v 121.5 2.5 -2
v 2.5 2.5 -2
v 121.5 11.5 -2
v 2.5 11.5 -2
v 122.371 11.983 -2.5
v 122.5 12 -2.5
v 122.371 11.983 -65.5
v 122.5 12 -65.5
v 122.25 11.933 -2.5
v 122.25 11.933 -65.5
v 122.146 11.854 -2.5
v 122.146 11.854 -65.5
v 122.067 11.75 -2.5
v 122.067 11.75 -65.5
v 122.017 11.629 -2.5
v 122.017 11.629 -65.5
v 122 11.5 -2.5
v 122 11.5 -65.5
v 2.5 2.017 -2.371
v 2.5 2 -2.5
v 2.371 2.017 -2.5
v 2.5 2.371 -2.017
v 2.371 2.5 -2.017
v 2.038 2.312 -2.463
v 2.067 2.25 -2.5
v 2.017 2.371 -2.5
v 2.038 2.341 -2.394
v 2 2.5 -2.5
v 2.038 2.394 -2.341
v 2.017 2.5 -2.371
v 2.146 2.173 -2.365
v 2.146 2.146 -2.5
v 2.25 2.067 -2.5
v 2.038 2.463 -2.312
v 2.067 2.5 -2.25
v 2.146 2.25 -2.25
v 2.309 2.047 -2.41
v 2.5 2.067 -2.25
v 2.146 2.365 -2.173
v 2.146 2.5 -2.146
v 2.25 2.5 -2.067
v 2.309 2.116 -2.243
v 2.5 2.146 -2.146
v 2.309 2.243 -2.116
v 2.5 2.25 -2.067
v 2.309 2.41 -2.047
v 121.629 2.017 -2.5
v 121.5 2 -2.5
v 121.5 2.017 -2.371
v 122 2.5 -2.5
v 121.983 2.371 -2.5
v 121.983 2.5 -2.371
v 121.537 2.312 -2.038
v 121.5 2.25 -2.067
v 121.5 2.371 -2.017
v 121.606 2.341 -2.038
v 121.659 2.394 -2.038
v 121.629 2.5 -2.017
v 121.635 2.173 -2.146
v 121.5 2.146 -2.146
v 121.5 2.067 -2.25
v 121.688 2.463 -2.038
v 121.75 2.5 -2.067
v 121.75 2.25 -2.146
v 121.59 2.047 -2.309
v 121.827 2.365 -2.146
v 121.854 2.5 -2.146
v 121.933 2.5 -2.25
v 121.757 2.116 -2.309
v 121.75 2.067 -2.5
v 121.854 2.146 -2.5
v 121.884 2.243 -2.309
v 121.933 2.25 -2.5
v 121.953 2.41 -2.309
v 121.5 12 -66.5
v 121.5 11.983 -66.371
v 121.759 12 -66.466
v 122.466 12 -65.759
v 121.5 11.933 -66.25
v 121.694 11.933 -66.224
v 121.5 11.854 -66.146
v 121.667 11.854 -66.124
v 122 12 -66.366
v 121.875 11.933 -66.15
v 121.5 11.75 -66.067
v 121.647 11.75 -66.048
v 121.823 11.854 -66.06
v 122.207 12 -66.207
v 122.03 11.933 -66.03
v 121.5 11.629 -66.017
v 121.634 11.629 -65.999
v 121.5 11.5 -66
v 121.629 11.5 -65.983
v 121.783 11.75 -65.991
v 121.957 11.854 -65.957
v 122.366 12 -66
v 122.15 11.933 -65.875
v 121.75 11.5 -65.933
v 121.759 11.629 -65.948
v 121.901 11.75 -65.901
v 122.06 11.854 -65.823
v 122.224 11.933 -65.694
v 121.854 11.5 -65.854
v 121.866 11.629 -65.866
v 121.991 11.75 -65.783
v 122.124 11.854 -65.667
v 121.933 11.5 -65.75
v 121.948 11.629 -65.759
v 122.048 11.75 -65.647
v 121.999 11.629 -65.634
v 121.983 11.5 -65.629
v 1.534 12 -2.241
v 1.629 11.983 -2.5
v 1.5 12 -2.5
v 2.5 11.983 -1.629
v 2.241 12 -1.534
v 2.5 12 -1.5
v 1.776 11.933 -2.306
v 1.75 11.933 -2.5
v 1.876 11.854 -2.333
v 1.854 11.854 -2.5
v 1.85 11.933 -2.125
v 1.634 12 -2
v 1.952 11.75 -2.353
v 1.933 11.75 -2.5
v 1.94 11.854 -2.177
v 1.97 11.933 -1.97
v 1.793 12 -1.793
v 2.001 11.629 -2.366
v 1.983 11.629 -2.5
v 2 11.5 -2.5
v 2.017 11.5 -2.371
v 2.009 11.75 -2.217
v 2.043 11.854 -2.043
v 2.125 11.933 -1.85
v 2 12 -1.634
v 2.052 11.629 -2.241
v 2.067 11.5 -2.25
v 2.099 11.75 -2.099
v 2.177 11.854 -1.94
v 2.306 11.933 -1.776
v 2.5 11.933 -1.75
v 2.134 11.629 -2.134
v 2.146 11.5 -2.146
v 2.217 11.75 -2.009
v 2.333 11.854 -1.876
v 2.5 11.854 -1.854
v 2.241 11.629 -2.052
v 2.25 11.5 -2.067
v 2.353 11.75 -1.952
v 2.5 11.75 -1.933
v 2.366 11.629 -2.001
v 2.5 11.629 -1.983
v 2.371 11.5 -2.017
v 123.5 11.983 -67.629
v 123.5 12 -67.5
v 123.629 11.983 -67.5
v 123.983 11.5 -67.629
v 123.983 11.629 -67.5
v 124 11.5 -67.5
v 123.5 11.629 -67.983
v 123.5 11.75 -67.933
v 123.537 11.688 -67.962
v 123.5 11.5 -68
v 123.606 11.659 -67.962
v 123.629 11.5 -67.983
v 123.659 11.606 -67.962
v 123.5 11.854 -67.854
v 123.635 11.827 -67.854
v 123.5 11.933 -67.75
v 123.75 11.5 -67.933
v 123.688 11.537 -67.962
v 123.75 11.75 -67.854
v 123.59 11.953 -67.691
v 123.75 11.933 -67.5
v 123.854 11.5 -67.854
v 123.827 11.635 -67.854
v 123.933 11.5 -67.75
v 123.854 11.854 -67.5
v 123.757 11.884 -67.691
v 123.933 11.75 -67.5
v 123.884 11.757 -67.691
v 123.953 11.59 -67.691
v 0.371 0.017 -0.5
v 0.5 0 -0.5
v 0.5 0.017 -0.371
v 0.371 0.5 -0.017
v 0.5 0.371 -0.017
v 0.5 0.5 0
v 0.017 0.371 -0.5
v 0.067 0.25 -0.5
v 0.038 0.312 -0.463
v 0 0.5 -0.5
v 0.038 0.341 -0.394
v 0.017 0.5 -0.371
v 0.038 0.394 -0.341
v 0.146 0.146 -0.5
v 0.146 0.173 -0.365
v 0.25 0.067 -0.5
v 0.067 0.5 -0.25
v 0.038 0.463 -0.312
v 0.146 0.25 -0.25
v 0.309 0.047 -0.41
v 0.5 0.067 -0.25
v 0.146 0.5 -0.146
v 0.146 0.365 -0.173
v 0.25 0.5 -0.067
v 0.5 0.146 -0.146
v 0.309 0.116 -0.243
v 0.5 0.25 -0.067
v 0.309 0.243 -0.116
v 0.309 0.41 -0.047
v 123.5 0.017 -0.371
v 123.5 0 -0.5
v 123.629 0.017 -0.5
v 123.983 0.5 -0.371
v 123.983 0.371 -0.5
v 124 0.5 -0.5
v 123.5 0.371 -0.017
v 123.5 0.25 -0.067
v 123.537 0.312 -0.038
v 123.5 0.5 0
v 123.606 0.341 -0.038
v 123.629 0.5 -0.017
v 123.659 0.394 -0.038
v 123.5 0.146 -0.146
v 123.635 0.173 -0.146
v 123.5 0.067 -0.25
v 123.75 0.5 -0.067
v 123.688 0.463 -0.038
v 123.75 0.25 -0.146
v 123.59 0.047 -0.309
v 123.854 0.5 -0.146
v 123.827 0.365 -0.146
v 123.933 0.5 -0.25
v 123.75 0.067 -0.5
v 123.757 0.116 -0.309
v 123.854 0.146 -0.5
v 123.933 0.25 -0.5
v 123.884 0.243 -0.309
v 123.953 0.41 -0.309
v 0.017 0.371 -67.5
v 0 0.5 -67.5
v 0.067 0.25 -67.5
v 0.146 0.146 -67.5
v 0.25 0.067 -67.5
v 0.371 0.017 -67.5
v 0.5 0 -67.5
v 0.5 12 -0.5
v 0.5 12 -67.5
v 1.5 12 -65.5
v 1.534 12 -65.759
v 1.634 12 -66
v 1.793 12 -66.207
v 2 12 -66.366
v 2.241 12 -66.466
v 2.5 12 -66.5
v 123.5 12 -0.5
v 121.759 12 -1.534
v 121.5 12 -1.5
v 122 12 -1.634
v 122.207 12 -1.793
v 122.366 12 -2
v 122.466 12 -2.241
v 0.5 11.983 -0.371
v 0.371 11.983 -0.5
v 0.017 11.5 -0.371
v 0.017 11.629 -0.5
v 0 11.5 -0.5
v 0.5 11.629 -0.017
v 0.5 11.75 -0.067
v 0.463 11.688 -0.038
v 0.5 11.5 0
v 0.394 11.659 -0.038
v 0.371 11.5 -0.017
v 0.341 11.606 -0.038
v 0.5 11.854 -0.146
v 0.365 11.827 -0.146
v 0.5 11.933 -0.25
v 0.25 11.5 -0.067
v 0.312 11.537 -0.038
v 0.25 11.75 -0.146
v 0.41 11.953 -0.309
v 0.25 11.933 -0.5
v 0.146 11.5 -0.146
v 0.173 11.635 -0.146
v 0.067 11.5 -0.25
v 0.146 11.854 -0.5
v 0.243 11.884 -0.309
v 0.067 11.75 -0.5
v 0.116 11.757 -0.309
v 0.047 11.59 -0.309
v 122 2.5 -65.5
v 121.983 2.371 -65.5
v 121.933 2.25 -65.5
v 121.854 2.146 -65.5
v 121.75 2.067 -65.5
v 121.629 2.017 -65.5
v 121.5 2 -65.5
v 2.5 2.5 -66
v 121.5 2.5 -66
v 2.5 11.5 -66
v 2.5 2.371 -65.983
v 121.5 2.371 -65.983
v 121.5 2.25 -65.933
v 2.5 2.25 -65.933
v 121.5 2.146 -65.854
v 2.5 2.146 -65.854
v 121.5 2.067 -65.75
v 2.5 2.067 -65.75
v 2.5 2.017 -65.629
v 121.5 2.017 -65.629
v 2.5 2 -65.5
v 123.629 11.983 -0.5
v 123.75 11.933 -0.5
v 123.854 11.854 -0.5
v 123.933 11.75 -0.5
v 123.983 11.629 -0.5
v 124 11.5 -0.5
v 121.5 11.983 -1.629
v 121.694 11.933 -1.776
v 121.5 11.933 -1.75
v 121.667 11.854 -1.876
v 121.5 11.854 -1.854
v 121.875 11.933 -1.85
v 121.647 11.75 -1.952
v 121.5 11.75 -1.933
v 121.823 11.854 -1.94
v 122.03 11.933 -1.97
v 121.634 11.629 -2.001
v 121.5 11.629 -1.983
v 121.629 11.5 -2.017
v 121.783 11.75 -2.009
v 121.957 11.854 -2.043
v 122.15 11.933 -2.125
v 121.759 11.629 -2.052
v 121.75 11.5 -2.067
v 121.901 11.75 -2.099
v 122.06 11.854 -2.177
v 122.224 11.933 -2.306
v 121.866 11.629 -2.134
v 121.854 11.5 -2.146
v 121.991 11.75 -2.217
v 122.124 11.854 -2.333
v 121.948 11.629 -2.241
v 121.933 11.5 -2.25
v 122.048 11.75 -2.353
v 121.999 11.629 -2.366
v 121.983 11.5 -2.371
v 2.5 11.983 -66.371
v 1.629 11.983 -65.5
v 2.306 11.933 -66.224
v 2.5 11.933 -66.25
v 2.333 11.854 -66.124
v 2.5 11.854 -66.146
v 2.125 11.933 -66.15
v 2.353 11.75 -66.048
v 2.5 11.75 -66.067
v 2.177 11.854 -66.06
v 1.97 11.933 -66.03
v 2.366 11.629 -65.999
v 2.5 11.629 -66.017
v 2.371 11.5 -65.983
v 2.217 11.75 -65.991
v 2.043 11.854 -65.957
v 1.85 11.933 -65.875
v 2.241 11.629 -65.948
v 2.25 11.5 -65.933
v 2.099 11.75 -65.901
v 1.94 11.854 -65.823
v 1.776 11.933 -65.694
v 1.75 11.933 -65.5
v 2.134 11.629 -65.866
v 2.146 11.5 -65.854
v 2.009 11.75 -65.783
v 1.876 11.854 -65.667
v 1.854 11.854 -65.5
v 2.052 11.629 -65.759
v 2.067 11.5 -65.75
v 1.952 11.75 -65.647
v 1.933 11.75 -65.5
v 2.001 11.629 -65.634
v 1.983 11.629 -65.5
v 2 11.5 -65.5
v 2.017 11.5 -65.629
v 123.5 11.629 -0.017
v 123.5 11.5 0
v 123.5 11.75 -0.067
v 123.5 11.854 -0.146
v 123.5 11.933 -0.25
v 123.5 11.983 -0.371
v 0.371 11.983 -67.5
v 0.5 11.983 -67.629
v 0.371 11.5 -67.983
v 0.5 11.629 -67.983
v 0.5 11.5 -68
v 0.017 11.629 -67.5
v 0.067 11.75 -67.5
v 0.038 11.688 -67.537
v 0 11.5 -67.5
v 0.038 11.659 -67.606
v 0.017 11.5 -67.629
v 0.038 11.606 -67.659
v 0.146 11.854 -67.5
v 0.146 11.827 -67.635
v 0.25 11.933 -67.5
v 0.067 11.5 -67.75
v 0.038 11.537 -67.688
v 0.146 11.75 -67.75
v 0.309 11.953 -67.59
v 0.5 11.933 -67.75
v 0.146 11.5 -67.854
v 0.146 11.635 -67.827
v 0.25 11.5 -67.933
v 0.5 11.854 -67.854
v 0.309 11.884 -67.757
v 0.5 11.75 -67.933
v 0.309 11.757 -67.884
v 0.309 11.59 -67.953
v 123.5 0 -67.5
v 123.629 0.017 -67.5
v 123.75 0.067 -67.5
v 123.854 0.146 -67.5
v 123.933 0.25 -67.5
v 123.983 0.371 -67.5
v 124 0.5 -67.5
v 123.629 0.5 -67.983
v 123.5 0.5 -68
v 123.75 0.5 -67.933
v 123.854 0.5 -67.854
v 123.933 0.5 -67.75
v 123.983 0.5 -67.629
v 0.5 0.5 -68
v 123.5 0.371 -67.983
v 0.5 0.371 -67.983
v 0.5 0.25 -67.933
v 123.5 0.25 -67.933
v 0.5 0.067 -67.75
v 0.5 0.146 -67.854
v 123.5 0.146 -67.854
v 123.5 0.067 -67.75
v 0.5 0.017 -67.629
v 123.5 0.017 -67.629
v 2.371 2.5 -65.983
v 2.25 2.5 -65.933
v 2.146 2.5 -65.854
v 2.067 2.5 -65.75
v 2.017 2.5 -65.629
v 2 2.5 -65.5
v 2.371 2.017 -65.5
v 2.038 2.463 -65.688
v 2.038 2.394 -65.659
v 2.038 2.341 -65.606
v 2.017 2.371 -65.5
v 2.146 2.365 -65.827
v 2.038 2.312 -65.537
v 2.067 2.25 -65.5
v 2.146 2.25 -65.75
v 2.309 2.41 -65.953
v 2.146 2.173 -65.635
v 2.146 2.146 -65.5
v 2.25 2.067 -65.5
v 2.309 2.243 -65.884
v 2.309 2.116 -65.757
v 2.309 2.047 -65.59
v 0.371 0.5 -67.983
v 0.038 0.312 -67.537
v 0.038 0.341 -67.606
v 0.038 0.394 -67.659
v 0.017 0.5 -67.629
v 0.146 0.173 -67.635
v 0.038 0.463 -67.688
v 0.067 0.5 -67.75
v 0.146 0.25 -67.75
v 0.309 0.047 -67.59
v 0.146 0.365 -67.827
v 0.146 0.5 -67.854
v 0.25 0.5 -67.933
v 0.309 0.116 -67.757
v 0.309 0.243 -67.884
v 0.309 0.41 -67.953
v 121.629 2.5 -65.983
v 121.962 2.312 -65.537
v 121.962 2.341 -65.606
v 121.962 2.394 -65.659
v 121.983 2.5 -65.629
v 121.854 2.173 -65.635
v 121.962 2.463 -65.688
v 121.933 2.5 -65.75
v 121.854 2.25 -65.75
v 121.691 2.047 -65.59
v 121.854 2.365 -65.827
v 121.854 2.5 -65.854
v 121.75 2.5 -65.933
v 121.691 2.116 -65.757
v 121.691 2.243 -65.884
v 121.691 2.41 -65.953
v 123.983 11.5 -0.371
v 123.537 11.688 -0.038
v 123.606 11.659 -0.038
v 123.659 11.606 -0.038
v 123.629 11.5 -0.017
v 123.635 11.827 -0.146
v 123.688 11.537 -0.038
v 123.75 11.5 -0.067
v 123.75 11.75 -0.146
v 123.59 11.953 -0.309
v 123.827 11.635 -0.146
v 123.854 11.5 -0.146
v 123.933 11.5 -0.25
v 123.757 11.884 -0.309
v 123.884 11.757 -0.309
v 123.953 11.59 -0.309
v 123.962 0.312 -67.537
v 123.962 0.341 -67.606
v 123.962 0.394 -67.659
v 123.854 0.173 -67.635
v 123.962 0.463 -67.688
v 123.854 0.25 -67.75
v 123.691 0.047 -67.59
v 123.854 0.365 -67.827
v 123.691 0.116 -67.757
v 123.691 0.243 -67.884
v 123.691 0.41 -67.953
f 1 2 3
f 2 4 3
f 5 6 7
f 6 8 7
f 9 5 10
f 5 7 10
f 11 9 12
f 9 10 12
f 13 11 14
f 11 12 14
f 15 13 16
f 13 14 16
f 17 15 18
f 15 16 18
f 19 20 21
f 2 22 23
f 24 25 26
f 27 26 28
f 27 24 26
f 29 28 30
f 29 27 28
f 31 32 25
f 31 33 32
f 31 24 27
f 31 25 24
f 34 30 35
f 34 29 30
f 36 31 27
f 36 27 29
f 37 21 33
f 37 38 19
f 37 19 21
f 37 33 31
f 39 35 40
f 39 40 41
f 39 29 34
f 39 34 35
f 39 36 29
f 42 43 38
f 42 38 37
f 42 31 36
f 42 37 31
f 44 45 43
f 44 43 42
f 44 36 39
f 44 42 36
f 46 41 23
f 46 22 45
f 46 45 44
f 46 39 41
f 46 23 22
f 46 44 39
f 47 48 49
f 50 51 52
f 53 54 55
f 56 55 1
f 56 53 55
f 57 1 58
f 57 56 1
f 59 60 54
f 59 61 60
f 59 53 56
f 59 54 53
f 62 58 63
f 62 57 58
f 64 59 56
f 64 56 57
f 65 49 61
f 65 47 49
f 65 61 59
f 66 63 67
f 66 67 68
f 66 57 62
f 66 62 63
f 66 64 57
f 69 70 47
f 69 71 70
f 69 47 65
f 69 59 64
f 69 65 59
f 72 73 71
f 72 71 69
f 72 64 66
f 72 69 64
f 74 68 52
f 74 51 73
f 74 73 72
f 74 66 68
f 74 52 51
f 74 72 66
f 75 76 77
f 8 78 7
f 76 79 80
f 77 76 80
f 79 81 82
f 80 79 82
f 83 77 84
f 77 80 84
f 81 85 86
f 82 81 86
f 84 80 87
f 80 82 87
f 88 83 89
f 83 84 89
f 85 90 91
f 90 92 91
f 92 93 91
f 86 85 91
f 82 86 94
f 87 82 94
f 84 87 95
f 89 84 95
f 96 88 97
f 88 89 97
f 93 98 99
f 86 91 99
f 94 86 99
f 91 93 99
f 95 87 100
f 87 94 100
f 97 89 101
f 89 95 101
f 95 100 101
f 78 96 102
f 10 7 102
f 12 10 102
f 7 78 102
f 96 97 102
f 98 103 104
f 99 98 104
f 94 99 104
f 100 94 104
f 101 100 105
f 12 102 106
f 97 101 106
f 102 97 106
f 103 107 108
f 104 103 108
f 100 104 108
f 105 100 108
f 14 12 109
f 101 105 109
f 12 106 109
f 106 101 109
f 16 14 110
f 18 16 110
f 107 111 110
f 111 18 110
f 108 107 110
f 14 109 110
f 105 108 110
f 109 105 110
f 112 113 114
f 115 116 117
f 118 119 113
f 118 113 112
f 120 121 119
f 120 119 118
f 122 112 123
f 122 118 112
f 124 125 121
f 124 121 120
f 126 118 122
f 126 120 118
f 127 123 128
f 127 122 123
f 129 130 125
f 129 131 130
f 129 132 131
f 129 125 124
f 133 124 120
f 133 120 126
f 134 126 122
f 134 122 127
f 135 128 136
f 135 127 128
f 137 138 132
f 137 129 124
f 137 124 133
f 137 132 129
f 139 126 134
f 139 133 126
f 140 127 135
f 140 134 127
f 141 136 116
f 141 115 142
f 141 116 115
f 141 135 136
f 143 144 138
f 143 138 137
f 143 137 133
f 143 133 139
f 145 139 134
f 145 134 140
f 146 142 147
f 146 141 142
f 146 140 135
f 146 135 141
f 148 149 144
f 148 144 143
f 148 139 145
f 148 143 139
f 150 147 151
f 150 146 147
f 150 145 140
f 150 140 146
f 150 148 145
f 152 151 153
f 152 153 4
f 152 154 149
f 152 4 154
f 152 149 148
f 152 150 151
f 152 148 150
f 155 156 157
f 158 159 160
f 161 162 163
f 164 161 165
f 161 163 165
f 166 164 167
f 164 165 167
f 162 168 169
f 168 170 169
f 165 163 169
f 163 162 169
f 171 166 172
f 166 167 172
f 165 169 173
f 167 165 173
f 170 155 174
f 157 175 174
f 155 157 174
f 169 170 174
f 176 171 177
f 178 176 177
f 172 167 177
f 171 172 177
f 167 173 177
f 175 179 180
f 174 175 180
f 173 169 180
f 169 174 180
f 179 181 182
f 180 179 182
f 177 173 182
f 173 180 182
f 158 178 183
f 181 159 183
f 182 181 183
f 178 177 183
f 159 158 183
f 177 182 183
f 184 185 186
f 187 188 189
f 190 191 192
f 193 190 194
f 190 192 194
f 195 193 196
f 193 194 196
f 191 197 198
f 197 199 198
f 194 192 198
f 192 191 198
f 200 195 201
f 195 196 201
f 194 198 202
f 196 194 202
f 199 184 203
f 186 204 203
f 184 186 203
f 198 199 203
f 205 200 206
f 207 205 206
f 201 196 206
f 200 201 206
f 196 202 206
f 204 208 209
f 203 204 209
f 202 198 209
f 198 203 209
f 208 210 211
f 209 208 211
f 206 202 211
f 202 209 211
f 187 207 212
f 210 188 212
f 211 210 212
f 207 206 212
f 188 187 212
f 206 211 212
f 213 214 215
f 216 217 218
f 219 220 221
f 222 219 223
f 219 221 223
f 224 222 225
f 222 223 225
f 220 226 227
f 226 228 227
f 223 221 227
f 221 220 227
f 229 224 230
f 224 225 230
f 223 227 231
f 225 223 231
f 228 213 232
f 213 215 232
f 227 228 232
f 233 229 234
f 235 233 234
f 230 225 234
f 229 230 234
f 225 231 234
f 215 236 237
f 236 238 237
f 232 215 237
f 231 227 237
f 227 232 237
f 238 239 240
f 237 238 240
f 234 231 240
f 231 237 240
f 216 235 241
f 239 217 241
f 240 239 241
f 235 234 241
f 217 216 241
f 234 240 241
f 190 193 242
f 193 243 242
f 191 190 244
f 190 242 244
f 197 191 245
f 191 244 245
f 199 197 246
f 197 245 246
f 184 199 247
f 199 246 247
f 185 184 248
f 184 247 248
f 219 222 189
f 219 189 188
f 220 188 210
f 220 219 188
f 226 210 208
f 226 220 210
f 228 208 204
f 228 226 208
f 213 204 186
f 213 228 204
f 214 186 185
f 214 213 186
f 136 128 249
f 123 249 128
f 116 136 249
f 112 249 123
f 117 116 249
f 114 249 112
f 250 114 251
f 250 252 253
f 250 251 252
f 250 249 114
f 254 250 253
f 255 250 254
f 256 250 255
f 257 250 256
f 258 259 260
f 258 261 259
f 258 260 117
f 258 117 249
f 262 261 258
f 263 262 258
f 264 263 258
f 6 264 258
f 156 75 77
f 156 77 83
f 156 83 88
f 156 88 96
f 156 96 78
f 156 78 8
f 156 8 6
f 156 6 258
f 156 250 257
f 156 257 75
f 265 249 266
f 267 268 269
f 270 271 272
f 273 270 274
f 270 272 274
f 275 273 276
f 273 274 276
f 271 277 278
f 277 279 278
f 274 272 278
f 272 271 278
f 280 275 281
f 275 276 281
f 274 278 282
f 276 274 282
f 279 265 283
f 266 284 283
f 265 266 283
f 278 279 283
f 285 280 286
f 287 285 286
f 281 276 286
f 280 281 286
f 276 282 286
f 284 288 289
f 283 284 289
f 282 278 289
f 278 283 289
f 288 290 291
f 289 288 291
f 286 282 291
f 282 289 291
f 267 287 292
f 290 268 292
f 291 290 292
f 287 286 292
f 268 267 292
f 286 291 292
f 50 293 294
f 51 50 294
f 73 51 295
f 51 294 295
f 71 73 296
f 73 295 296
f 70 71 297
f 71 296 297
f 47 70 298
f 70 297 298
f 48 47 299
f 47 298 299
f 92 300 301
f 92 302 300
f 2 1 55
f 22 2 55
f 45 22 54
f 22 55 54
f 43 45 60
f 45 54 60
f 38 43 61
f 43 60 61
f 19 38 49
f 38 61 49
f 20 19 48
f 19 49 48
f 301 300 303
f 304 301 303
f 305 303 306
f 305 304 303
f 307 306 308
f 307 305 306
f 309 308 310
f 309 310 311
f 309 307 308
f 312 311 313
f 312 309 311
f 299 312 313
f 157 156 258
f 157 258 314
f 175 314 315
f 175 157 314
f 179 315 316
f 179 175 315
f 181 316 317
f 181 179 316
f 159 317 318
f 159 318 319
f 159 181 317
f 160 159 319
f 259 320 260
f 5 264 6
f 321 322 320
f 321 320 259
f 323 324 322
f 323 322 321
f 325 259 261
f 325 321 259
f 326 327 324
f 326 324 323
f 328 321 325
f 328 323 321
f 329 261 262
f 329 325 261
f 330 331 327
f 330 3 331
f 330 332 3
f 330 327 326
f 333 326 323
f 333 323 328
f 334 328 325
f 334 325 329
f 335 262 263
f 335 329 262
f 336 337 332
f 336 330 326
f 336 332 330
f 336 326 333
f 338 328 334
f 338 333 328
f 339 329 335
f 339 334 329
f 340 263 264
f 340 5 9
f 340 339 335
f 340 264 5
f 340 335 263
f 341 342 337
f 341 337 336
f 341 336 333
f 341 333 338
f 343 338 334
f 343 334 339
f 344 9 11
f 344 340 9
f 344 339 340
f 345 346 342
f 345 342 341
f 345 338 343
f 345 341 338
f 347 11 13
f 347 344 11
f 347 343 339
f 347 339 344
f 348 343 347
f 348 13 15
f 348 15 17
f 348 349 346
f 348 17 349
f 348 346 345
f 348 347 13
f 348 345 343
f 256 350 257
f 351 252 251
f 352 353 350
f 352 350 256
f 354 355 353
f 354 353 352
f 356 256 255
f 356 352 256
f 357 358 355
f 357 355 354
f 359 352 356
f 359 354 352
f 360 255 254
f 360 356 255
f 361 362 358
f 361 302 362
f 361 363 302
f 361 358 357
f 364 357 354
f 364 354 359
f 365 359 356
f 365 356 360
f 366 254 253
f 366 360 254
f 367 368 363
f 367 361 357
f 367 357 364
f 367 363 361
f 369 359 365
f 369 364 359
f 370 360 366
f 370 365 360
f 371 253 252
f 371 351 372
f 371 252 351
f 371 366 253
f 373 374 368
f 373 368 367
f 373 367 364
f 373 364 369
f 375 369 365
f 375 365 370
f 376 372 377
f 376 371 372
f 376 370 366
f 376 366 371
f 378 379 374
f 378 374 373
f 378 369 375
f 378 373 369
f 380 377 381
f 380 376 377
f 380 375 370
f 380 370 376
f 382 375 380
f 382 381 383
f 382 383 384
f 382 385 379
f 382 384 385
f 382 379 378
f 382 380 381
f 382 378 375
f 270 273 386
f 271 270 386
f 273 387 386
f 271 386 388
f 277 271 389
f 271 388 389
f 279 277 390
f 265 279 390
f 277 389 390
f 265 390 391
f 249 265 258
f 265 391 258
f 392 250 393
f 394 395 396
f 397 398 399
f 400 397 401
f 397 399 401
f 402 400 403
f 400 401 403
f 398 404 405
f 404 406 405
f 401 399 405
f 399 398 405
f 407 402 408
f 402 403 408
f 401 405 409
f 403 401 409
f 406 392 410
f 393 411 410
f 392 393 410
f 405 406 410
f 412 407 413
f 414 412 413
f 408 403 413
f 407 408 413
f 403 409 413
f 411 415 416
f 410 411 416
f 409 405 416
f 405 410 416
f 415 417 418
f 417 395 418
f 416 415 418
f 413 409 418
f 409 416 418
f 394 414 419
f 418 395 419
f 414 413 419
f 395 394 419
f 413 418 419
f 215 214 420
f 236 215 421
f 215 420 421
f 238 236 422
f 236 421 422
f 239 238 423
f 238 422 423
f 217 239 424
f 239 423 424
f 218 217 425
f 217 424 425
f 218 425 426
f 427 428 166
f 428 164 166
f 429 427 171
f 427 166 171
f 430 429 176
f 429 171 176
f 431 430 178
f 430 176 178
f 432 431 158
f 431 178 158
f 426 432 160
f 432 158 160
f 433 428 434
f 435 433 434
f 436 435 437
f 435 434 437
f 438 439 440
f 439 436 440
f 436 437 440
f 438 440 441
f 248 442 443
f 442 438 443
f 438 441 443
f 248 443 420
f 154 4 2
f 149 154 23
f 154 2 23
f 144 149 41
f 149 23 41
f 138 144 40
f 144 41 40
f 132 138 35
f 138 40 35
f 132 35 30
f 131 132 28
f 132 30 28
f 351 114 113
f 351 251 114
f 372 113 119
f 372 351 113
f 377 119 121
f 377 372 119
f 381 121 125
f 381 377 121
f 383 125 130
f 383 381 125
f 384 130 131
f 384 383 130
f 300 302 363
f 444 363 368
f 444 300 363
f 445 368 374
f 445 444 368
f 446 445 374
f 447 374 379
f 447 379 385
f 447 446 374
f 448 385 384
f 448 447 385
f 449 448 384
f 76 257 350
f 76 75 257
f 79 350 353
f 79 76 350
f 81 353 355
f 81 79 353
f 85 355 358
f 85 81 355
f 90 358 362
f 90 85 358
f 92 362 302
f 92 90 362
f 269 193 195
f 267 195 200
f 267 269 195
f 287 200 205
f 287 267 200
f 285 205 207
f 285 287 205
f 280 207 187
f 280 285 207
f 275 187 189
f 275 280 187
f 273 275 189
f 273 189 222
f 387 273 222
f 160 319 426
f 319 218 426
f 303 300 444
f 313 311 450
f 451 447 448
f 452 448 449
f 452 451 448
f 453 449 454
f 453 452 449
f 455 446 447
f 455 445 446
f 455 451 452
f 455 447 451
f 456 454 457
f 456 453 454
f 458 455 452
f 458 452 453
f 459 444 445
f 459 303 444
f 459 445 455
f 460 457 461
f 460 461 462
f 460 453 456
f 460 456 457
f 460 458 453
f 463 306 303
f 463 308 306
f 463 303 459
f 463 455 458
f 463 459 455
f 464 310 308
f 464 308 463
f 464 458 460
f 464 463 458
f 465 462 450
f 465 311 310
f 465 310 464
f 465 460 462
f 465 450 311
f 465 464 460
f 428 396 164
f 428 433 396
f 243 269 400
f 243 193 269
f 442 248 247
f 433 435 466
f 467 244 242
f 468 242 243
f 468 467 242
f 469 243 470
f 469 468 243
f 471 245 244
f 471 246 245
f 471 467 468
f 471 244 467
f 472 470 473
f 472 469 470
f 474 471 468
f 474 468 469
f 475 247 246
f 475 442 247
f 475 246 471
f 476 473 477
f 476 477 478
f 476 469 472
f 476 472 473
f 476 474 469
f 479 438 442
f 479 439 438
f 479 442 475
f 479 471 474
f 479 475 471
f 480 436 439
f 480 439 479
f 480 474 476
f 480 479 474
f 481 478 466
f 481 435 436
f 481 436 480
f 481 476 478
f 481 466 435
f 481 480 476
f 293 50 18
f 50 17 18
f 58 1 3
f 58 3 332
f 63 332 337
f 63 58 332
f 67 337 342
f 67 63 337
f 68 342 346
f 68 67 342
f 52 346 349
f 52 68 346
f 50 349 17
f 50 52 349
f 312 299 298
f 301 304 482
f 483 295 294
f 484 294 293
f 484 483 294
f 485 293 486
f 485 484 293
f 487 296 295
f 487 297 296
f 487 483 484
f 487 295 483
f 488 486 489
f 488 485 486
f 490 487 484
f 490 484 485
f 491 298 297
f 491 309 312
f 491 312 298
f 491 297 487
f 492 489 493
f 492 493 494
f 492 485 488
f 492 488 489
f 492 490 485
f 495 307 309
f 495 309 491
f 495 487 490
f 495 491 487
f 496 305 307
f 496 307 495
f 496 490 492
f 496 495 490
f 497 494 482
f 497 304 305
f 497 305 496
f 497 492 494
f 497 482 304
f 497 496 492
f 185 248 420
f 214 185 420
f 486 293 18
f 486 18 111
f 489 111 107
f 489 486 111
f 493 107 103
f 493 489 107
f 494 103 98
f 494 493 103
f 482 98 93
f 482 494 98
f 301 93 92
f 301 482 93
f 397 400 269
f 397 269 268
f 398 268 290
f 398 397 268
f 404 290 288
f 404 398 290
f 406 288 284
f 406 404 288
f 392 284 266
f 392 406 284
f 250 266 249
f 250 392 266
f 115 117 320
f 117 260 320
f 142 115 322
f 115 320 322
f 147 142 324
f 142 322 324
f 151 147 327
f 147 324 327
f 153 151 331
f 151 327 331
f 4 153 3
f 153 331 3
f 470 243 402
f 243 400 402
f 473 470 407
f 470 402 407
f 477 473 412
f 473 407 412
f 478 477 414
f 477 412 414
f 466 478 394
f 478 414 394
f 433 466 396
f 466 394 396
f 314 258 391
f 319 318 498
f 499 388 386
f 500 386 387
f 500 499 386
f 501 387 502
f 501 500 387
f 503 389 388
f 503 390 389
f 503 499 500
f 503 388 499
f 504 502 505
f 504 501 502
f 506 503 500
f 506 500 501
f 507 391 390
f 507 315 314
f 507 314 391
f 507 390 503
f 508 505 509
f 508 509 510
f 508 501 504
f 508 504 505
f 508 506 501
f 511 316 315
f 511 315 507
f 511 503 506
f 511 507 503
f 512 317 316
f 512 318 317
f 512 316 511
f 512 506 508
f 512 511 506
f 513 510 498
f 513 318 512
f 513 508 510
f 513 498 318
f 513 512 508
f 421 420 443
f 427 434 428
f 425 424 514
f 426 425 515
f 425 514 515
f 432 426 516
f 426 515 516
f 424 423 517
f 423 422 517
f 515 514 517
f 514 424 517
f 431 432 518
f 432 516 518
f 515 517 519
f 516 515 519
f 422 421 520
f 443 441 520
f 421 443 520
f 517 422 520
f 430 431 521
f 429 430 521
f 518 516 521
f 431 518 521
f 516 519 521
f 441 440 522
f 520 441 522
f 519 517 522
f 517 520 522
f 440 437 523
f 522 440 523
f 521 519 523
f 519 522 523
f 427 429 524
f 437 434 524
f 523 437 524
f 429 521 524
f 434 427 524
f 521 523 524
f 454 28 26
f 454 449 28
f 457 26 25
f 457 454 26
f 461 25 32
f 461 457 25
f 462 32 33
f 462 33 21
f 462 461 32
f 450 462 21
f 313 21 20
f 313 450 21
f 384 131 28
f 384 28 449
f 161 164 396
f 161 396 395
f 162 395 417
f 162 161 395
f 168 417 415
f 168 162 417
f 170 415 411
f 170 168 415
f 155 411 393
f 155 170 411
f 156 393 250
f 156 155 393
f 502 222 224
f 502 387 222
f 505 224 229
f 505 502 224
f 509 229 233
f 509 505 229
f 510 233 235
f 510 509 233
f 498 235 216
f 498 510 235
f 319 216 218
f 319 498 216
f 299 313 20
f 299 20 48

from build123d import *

# Parameters (mm, degrees)
SKETCH1_W           = 124
SKETCH1_H           = 68
BOSS_EXTRUDE1_DEPTH = 12
SKETCH2_W           = 120
SKETCH2_H           = 64
CUT_EXTRUDE1_DEPTH  = 10
FILLET1_R           = 0.5


with BuildPart() as part:
    # Sketch1 → Boss-Extrude1 (new body)
    with BuildSketch(Plane(origin=(0, 0, 0), x_dir=(1, 0, 0), z_dir=(0, 1, 0))):
        with Locations((62, 34)):
            Rectangle(SKETCH1_W, SKETCH1_H)
    extrude(amount=BOSS_EXTRUDE1_DEPTH)

    # Sketch2 → Cut-Extrude1 (cut)
    with BuildSketch(Plane(origin=(0, 12, 0), x_dir=(1, 0, 0), z_dir=(0, 1, 0))):
        with Locations((62, 34)):
            Rectangle(SKETCH2_W, SKETCH2_H)
    extrude(amount=-CUT_EXTRUDE1_DEPTH, mode=Mode.SUBTRACT)

    # Fillet1
    fillet1_edges = [part.edges().sort_by_distance(p)[0] for p in [
        (124, 12, -34),
        (62, 12, -68),
        (62, 2, -66),
        (2, 7, -66),
        (122, 2, -34),
        (122, 7, -66),
        (62, 2, -2),
        (122, 7, -2),
        (2, 2, -34),
        (2, 7, -2),
        (62, 12, -66),
        (2, 12, -34),
        (62, 12, -2),
        (122, 12, -34),
        (0, 12, -34),
        (62, 0, -68),
        (124, 0, -34),
        (62, 0, 0),
        (0, 0, -34),
        (62, 12, 0),
        (0, 6, -68),
        (124, 6, -68),
        (124, 6, 0),
        (0, 6, 0),
    ]]
    fillet(fillet1_edges, radius=FILLET1_R)


solid = part.part
